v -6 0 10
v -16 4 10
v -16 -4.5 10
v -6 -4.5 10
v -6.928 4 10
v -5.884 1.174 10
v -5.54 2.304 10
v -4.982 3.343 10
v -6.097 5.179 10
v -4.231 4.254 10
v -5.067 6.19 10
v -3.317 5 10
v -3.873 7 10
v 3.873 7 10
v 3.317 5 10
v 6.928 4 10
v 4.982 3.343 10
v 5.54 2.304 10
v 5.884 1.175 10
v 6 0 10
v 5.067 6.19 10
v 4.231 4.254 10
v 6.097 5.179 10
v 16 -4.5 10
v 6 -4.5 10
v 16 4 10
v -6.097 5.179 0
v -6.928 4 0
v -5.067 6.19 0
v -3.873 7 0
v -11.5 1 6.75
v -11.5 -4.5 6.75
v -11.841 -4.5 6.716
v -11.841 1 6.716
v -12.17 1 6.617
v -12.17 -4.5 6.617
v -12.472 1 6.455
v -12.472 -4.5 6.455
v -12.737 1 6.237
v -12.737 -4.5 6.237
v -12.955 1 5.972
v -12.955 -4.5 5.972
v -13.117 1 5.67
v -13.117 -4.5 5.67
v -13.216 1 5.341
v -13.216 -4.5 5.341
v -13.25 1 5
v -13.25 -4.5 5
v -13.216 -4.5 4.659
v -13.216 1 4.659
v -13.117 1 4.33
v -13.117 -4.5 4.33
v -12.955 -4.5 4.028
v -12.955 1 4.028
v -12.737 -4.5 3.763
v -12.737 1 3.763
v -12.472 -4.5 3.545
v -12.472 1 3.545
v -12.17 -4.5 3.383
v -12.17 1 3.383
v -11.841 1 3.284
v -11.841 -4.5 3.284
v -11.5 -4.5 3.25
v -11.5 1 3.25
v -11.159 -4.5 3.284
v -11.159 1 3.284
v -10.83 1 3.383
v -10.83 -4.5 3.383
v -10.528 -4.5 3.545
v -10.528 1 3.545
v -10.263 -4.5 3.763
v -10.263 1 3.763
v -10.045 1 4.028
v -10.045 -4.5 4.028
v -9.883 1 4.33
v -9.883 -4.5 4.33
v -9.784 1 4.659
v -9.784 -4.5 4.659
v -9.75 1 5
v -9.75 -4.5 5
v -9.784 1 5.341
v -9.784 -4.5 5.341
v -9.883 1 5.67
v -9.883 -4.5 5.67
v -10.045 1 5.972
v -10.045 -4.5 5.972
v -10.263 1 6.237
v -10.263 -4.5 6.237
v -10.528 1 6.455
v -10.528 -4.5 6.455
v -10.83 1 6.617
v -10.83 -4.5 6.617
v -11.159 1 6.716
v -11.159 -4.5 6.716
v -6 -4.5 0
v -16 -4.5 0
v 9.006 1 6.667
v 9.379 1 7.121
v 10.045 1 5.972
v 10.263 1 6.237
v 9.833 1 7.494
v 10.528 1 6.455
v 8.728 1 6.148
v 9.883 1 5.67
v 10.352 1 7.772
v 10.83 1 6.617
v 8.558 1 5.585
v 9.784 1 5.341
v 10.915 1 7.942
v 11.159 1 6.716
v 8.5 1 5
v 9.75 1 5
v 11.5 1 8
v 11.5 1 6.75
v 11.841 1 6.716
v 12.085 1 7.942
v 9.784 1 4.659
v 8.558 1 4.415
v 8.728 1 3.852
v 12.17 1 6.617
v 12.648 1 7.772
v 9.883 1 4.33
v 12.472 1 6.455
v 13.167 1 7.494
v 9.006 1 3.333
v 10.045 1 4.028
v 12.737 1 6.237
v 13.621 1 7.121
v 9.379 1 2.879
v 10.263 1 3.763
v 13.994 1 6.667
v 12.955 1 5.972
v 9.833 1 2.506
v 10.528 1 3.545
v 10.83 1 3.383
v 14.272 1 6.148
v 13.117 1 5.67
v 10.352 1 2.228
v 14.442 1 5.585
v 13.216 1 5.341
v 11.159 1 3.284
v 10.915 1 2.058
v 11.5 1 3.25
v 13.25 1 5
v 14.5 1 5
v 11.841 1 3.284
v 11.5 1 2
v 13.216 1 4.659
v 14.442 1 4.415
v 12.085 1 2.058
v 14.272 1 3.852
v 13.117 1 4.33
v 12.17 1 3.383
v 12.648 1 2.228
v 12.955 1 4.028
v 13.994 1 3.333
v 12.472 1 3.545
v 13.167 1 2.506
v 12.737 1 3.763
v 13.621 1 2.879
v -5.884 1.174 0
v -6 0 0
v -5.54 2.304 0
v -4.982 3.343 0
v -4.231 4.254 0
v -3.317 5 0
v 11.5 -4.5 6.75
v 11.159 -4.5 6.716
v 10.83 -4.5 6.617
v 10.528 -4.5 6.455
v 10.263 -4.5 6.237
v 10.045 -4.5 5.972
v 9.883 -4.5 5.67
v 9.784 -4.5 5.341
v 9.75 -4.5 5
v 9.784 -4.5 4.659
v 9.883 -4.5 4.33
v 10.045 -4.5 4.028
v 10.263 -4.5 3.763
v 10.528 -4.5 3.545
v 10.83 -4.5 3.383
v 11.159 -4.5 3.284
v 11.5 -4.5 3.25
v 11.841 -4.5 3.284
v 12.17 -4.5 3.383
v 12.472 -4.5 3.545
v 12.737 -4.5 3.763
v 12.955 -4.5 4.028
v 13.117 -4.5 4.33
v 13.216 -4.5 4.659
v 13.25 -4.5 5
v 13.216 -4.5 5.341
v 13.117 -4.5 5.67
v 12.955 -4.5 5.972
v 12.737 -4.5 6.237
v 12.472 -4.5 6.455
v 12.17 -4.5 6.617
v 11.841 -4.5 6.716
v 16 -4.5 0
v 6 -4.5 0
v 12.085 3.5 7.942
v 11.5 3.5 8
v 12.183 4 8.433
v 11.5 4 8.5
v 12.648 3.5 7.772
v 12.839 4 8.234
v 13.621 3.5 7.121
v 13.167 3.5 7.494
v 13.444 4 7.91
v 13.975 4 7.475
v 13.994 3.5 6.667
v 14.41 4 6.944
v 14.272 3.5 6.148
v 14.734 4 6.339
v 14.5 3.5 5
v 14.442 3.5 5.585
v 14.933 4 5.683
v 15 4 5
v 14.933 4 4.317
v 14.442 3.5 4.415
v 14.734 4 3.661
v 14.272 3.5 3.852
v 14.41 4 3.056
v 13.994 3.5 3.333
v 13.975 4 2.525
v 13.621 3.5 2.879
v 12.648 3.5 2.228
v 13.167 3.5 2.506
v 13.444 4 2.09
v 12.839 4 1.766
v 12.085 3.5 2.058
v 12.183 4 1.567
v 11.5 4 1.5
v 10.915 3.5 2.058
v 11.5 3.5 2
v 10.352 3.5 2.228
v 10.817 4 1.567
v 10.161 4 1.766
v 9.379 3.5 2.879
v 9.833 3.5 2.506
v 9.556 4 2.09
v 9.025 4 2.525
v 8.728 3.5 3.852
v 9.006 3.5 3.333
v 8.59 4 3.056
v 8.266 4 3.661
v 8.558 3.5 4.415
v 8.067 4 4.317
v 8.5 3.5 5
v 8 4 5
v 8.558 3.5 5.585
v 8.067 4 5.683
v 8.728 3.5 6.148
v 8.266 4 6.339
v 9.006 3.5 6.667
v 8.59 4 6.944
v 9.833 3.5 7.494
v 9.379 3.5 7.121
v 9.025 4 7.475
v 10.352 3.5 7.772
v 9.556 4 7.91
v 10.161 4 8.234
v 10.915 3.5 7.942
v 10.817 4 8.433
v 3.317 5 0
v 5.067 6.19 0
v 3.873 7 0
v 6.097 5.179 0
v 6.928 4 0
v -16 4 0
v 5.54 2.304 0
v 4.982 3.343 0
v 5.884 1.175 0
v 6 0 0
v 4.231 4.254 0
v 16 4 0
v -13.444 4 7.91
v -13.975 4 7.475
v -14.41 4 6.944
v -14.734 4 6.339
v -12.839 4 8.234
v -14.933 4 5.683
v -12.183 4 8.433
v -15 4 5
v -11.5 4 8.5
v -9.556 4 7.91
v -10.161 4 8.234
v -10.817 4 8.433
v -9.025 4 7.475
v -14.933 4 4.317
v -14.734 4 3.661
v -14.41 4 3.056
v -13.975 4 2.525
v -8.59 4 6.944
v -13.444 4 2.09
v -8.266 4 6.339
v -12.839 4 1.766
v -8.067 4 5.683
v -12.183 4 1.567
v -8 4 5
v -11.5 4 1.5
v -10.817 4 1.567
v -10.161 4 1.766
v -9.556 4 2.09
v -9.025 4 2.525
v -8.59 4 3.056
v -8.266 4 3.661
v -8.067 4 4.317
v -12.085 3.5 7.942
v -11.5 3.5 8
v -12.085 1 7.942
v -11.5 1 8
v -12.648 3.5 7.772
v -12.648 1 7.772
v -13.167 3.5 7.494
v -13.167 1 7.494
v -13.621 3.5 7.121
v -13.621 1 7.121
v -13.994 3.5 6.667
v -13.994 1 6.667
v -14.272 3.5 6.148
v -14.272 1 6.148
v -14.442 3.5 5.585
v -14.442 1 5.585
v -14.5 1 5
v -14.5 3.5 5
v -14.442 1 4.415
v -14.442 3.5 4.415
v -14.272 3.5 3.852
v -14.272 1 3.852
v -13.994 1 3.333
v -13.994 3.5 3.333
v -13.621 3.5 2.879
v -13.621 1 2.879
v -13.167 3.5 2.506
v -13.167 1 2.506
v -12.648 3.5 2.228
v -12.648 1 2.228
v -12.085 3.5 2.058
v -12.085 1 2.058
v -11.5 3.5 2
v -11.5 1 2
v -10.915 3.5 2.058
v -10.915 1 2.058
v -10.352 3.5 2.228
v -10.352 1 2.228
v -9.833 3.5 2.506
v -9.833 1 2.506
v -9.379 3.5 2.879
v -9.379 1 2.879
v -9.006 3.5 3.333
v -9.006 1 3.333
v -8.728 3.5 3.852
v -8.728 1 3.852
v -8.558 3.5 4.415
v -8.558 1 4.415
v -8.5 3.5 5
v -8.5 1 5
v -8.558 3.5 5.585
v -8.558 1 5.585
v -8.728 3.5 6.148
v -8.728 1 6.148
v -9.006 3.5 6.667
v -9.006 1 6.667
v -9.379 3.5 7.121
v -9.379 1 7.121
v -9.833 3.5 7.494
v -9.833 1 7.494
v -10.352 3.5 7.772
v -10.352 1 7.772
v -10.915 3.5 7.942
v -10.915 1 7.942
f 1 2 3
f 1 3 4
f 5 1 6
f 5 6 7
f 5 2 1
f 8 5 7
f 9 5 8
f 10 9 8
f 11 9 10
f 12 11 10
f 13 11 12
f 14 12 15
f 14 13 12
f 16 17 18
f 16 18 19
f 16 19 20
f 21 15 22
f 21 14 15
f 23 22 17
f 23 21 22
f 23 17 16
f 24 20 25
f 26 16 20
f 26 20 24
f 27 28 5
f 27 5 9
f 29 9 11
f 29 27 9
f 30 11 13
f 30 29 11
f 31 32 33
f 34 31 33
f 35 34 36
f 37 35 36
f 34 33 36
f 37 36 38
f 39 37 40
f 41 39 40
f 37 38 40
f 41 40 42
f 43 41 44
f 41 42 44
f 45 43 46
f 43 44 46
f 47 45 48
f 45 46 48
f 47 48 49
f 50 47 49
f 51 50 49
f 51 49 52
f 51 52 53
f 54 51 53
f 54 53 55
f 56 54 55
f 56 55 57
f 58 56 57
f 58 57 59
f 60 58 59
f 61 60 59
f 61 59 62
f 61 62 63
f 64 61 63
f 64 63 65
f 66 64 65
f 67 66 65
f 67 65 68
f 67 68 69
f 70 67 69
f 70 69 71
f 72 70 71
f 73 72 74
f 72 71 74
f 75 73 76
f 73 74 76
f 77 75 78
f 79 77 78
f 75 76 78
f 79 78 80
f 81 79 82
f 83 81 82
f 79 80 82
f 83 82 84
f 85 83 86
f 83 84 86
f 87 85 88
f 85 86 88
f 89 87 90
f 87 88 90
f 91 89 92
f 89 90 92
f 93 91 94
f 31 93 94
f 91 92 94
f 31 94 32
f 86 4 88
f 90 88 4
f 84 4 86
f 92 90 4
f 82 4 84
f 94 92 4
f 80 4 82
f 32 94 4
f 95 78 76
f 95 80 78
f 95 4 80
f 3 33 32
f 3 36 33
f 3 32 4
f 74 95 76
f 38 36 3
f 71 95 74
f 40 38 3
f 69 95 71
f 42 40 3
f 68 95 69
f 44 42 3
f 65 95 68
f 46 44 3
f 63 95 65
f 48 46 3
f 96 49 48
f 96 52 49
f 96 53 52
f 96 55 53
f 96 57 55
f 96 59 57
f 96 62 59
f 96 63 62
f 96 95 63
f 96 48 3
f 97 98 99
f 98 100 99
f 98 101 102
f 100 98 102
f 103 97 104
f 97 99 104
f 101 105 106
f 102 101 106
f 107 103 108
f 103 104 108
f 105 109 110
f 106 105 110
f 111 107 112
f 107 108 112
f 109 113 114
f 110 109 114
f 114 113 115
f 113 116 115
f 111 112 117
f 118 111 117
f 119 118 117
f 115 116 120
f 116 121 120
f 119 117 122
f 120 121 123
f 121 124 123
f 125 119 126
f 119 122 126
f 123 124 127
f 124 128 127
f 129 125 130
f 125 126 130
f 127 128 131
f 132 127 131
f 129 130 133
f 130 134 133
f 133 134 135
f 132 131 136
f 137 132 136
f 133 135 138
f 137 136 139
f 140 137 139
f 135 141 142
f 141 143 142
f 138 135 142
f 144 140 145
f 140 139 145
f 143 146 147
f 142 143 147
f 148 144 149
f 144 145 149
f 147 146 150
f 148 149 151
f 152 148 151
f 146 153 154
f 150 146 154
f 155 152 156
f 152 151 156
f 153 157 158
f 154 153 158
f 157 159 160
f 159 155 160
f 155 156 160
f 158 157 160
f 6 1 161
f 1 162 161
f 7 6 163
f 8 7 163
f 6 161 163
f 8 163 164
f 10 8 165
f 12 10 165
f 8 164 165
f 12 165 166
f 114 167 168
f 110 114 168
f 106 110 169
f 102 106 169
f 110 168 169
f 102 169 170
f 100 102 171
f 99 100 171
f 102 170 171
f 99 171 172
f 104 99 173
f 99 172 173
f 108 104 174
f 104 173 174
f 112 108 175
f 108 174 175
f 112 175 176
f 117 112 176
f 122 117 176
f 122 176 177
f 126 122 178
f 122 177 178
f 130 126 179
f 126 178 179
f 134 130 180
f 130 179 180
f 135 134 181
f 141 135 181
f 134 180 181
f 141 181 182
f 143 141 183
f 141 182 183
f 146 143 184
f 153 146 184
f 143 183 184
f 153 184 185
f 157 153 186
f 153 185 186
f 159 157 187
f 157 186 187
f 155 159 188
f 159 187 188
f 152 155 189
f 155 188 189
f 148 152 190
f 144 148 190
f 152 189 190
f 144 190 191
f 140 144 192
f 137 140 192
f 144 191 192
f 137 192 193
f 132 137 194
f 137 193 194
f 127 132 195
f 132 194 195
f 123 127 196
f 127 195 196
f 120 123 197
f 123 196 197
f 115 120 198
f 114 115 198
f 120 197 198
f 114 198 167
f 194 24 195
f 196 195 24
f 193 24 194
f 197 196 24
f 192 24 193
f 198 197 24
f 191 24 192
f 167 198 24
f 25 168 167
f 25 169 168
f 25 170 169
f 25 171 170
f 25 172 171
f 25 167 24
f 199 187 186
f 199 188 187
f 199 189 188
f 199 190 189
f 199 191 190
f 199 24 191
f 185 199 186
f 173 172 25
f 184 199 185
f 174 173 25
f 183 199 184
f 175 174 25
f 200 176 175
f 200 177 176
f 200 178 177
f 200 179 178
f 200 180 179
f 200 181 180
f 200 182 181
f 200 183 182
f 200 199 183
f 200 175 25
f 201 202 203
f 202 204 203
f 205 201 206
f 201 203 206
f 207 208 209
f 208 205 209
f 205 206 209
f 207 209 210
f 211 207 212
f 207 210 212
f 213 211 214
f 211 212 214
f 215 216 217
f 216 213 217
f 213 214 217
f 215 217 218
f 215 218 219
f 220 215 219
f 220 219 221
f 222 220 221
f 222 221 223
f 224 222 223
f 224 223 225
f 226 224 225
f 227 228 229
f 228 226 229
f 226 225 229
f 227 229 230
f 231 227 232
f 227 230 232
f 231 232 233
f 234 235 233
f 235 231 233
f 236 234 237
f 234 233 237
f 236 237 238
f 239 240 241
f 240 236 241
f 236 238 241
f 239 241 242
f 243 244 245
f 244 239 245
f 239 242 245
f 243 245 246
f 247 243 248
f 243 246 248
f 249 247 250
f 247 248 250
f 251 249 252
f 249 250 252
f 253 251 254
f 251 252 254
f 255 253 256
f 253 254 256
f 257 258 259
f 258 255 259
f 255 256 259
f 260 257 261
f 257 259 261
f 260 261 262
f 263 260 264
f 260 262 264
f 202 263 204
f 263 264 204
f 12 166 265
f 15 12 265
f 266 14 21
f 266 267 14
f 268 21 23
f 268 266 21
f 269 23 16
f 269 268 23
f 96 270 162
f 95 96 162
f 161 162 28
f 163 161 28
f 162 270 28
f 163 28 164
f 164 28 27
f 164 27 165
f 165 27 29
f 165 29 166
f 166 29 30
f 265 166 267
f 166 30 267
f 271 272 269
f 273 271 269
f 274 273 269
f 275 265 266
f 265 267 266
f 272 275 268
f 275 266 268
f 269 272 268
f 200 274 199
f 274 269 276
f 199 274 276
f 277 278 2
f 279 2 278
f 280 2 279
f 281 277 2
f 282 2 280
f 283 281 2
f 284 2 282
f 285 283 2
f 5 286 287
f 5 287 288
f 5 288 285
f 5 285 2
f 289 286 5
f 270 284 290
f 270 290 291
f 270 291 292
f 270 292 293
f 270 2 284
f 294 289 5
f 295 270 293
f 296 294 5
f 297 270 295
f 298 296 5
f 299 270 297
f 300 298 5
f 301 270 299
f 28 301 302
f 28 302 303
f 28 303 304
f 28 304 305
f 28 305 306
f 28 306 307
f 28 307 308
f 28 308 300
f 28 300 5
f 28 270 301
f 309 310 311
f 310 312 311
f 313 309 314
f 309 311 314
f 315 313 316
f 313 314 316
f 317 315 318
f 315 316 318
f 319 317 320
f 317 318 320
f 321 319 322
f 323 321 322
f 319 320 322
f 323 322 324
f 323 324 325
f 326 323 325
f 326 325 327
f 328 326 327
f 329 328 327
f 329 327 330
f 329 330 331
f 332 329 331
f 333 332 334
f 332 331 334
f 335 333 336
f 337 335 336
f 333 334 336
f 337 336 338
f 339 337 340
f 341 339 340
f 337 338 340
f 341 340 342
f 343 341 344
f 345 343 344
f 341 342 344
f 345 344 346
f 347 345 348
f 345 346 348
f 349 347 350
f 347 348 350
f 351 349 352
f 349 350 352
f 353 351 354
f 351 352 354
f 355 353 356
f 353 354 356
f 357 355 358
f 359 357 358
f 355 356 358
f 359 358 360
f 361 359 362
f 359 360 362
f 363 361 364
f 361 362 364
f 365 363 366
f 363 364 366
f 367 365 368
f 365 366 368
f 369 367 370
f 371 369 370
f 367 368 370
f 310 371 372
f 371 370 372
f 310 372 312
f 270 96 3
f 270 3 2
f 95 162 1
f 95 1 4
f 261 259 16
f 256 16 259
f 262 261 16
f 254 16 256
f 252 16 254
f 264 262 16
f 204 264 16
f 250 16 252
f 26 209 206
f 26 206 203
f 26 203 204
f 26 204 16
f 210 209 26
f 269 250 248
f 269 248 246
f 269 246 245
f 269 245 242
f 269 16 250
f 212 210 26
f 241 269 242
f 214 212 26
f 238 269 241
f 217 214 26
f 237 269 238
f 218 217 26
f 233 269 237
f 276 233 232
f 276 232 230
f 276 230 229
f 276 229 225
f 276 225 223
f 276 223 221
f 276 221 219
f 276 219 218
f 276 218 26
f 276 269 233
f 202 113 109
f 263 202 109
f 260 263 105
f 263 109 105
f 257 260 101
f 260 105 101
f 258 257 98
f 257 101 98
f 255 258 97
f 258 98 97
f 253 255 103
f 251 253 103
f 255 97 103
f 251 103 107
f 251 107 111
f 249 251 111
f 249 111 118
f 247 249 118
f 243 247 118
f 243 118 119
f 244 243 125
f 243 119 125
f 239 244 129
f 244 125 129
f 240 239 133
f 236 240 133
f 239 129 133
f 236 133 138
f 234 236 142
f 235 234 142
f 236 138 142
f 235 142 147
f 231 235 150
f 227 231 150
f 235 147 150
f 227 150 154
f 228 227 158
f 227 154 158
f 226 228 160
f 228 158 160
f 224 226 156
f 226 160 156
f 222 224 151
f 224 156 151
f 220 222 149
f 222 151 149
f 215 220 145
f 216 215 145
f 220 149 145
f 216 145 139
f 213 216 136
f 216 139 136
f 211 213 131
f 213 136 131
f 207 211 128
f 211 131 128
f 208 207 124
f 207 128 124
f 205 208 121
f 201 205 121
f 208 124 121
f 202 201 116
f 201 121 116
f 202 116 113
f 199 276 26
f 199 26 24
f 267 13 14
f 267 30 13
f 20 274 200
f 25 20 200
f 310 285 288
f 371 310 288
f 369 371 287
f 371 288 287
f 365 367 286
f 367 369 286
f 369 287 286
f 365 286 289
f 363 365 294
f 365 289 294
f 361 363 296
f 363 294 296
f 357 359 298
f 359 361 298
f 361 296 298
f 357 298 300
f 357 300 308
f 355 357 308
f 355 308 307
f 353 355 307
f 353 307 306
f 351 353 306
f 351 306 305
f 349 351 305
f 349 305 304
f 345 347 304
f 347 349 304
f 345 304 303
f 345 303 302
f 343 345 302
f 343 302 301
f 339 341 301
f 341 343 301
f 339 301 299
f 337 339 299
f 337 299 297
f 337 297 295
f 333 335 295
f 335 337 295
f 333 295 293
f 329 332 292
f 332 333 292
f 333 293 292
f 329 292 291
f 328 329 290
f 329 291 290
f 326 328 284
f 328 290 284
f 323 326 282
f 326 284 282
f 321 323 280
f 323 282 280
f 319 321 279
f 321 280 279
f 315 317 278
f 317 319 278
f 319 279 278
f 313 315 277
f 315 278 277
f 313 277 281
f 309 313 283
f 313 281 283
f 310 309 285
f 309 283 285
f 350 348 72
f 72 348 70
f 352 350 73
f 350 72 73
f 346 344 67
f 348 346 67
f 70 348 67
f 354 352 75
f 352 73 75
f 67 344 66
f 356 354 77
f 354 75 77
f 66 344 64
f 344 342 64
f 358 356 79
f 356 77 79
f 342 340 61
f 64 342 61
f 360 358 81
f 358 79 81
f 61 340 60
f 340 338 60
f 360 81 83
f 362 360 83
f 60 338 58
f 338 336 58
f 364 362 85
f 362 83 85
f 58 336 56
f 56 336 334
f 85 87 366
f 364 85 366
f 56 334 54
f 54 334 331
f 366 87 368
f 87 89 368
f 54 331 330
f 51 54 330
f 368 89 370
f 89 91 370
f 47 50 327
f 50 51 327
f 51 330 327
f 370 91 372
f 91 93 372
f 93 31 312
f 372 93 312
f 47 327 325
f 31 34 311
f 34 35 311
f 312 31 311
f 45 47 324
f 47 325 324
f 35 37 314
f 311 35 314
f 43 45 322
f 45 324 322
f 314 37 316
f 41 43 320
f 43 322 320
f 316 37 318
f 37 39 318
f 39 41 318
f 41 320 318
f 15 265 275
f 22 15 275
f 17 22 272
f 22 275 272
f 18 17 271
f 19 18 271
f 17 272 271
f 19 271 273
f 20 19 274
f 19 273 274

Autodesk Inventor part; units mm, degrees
ref_plane "YZ Plane" through (0, 0, 0) normal (1, 0, 0) x (0, 1, 0)
ref_plane "XZ Plane" through (0, 0, 0) normal (0, 1, 0) x (-1, 0, 0)
sketch "Náčrt1" plane through (0, 0, 0) normal (0, 0, 1) x (1, 0, 0)
  line L0 (-3.3166, 5) -> (3.3166, 5)
  line L1 (3.3166, -5) -> (-3.3166, -5)
  arc A0 (-3.3166, 5) -> (-6, 0) centre (0, 0) ccw
  arc A1 (6, 0) -> (3.3166, 5) centre (0, 0) ccw
  line L2 (-3.3166, 5) -> (3.3166, -5)
  line L3 (3.3166, 5) -> (-3.3166, -5)
  line L4 (-16, 7) -> (16, 7)
  line L5 (16, 7) -> (16, -5)
  line L6 (16, -5) -> (-16, -5)
  line L7 (-16, -5) -> (-16, 7)
  line L8 (0, 5) -> (0, -5)
  line L9 (-16, 4) -> (-6.9282, 4)
  arc A2 (8, 0) -> (3.873, 7) centre (0, 0) ccw
  line L10 (3.873, 7) -> (-3.873, 7)
  line L11 (-8, 0) -> (-8, -5)
  line L12 (-6, 0) -> (-6, -5)
  line L13 (6, 0) -> (6, -5)
  line L14 (8, 0) -> (8, -5)
  arc A3 (-3.873, 7) -> (-8, 0) centre (0, 0) ccw
  line L15 (6.9282, 4) -> (16, 4)
  point P0 (3.873, 7)
  dimension "d13" = 10
  dimension "d14" = 12
  dimension "d15" = 6
  dimension "d16" = 32
  dimension "d17" = 12
  dimension "d20" = 9
extrude "Vysunutí1" add sketch "Náčrt1" along normal blind 10 contours A0 L12 L6 L11 A3 L4 A2 L14 L13 A1 L0 | L6 L7 L9 A3 L11 | L14 A2 L15 L5 L6
sketch "Náčrt2" plane through (-16, 4, 0) normal (0, 1, 0) x (1, 0, 0)
  line L0 (0, 0) -> (0, -10) projected
  line L1 (9.0718, -10) -> (0, -10) projected
  point P0 (16, 0)
  point P1 (4.5, -5)
  dimension "d24" = 4.5
  dimension "d25" = 5
hole "Díra1" at (-11.5, 4, 5) direction (0, -1, 0) diameter 3.5 end through all counterbore diameter 6 counterbore depth 3
ref_plane "Pracovní rovina1" through (0, -5, 0) normal (1, 0, 0) x (0, 0, -1)
mirror "Zrcadlit1" about plane through (0, -5, 0) normal (1, 0, 0) of "Díra1"
move faces "Posunout1" translate (0, 0.5, 0) faces at (-7.2543, -5, 5.0703) (7.2543, -5, 5.0703)
chamfer "Zkosení1" distance 0.5 angle 45 2 edges at (-11.5, 4, 2) (11.5, 4, 2)
properties part number "Držak motoru"
